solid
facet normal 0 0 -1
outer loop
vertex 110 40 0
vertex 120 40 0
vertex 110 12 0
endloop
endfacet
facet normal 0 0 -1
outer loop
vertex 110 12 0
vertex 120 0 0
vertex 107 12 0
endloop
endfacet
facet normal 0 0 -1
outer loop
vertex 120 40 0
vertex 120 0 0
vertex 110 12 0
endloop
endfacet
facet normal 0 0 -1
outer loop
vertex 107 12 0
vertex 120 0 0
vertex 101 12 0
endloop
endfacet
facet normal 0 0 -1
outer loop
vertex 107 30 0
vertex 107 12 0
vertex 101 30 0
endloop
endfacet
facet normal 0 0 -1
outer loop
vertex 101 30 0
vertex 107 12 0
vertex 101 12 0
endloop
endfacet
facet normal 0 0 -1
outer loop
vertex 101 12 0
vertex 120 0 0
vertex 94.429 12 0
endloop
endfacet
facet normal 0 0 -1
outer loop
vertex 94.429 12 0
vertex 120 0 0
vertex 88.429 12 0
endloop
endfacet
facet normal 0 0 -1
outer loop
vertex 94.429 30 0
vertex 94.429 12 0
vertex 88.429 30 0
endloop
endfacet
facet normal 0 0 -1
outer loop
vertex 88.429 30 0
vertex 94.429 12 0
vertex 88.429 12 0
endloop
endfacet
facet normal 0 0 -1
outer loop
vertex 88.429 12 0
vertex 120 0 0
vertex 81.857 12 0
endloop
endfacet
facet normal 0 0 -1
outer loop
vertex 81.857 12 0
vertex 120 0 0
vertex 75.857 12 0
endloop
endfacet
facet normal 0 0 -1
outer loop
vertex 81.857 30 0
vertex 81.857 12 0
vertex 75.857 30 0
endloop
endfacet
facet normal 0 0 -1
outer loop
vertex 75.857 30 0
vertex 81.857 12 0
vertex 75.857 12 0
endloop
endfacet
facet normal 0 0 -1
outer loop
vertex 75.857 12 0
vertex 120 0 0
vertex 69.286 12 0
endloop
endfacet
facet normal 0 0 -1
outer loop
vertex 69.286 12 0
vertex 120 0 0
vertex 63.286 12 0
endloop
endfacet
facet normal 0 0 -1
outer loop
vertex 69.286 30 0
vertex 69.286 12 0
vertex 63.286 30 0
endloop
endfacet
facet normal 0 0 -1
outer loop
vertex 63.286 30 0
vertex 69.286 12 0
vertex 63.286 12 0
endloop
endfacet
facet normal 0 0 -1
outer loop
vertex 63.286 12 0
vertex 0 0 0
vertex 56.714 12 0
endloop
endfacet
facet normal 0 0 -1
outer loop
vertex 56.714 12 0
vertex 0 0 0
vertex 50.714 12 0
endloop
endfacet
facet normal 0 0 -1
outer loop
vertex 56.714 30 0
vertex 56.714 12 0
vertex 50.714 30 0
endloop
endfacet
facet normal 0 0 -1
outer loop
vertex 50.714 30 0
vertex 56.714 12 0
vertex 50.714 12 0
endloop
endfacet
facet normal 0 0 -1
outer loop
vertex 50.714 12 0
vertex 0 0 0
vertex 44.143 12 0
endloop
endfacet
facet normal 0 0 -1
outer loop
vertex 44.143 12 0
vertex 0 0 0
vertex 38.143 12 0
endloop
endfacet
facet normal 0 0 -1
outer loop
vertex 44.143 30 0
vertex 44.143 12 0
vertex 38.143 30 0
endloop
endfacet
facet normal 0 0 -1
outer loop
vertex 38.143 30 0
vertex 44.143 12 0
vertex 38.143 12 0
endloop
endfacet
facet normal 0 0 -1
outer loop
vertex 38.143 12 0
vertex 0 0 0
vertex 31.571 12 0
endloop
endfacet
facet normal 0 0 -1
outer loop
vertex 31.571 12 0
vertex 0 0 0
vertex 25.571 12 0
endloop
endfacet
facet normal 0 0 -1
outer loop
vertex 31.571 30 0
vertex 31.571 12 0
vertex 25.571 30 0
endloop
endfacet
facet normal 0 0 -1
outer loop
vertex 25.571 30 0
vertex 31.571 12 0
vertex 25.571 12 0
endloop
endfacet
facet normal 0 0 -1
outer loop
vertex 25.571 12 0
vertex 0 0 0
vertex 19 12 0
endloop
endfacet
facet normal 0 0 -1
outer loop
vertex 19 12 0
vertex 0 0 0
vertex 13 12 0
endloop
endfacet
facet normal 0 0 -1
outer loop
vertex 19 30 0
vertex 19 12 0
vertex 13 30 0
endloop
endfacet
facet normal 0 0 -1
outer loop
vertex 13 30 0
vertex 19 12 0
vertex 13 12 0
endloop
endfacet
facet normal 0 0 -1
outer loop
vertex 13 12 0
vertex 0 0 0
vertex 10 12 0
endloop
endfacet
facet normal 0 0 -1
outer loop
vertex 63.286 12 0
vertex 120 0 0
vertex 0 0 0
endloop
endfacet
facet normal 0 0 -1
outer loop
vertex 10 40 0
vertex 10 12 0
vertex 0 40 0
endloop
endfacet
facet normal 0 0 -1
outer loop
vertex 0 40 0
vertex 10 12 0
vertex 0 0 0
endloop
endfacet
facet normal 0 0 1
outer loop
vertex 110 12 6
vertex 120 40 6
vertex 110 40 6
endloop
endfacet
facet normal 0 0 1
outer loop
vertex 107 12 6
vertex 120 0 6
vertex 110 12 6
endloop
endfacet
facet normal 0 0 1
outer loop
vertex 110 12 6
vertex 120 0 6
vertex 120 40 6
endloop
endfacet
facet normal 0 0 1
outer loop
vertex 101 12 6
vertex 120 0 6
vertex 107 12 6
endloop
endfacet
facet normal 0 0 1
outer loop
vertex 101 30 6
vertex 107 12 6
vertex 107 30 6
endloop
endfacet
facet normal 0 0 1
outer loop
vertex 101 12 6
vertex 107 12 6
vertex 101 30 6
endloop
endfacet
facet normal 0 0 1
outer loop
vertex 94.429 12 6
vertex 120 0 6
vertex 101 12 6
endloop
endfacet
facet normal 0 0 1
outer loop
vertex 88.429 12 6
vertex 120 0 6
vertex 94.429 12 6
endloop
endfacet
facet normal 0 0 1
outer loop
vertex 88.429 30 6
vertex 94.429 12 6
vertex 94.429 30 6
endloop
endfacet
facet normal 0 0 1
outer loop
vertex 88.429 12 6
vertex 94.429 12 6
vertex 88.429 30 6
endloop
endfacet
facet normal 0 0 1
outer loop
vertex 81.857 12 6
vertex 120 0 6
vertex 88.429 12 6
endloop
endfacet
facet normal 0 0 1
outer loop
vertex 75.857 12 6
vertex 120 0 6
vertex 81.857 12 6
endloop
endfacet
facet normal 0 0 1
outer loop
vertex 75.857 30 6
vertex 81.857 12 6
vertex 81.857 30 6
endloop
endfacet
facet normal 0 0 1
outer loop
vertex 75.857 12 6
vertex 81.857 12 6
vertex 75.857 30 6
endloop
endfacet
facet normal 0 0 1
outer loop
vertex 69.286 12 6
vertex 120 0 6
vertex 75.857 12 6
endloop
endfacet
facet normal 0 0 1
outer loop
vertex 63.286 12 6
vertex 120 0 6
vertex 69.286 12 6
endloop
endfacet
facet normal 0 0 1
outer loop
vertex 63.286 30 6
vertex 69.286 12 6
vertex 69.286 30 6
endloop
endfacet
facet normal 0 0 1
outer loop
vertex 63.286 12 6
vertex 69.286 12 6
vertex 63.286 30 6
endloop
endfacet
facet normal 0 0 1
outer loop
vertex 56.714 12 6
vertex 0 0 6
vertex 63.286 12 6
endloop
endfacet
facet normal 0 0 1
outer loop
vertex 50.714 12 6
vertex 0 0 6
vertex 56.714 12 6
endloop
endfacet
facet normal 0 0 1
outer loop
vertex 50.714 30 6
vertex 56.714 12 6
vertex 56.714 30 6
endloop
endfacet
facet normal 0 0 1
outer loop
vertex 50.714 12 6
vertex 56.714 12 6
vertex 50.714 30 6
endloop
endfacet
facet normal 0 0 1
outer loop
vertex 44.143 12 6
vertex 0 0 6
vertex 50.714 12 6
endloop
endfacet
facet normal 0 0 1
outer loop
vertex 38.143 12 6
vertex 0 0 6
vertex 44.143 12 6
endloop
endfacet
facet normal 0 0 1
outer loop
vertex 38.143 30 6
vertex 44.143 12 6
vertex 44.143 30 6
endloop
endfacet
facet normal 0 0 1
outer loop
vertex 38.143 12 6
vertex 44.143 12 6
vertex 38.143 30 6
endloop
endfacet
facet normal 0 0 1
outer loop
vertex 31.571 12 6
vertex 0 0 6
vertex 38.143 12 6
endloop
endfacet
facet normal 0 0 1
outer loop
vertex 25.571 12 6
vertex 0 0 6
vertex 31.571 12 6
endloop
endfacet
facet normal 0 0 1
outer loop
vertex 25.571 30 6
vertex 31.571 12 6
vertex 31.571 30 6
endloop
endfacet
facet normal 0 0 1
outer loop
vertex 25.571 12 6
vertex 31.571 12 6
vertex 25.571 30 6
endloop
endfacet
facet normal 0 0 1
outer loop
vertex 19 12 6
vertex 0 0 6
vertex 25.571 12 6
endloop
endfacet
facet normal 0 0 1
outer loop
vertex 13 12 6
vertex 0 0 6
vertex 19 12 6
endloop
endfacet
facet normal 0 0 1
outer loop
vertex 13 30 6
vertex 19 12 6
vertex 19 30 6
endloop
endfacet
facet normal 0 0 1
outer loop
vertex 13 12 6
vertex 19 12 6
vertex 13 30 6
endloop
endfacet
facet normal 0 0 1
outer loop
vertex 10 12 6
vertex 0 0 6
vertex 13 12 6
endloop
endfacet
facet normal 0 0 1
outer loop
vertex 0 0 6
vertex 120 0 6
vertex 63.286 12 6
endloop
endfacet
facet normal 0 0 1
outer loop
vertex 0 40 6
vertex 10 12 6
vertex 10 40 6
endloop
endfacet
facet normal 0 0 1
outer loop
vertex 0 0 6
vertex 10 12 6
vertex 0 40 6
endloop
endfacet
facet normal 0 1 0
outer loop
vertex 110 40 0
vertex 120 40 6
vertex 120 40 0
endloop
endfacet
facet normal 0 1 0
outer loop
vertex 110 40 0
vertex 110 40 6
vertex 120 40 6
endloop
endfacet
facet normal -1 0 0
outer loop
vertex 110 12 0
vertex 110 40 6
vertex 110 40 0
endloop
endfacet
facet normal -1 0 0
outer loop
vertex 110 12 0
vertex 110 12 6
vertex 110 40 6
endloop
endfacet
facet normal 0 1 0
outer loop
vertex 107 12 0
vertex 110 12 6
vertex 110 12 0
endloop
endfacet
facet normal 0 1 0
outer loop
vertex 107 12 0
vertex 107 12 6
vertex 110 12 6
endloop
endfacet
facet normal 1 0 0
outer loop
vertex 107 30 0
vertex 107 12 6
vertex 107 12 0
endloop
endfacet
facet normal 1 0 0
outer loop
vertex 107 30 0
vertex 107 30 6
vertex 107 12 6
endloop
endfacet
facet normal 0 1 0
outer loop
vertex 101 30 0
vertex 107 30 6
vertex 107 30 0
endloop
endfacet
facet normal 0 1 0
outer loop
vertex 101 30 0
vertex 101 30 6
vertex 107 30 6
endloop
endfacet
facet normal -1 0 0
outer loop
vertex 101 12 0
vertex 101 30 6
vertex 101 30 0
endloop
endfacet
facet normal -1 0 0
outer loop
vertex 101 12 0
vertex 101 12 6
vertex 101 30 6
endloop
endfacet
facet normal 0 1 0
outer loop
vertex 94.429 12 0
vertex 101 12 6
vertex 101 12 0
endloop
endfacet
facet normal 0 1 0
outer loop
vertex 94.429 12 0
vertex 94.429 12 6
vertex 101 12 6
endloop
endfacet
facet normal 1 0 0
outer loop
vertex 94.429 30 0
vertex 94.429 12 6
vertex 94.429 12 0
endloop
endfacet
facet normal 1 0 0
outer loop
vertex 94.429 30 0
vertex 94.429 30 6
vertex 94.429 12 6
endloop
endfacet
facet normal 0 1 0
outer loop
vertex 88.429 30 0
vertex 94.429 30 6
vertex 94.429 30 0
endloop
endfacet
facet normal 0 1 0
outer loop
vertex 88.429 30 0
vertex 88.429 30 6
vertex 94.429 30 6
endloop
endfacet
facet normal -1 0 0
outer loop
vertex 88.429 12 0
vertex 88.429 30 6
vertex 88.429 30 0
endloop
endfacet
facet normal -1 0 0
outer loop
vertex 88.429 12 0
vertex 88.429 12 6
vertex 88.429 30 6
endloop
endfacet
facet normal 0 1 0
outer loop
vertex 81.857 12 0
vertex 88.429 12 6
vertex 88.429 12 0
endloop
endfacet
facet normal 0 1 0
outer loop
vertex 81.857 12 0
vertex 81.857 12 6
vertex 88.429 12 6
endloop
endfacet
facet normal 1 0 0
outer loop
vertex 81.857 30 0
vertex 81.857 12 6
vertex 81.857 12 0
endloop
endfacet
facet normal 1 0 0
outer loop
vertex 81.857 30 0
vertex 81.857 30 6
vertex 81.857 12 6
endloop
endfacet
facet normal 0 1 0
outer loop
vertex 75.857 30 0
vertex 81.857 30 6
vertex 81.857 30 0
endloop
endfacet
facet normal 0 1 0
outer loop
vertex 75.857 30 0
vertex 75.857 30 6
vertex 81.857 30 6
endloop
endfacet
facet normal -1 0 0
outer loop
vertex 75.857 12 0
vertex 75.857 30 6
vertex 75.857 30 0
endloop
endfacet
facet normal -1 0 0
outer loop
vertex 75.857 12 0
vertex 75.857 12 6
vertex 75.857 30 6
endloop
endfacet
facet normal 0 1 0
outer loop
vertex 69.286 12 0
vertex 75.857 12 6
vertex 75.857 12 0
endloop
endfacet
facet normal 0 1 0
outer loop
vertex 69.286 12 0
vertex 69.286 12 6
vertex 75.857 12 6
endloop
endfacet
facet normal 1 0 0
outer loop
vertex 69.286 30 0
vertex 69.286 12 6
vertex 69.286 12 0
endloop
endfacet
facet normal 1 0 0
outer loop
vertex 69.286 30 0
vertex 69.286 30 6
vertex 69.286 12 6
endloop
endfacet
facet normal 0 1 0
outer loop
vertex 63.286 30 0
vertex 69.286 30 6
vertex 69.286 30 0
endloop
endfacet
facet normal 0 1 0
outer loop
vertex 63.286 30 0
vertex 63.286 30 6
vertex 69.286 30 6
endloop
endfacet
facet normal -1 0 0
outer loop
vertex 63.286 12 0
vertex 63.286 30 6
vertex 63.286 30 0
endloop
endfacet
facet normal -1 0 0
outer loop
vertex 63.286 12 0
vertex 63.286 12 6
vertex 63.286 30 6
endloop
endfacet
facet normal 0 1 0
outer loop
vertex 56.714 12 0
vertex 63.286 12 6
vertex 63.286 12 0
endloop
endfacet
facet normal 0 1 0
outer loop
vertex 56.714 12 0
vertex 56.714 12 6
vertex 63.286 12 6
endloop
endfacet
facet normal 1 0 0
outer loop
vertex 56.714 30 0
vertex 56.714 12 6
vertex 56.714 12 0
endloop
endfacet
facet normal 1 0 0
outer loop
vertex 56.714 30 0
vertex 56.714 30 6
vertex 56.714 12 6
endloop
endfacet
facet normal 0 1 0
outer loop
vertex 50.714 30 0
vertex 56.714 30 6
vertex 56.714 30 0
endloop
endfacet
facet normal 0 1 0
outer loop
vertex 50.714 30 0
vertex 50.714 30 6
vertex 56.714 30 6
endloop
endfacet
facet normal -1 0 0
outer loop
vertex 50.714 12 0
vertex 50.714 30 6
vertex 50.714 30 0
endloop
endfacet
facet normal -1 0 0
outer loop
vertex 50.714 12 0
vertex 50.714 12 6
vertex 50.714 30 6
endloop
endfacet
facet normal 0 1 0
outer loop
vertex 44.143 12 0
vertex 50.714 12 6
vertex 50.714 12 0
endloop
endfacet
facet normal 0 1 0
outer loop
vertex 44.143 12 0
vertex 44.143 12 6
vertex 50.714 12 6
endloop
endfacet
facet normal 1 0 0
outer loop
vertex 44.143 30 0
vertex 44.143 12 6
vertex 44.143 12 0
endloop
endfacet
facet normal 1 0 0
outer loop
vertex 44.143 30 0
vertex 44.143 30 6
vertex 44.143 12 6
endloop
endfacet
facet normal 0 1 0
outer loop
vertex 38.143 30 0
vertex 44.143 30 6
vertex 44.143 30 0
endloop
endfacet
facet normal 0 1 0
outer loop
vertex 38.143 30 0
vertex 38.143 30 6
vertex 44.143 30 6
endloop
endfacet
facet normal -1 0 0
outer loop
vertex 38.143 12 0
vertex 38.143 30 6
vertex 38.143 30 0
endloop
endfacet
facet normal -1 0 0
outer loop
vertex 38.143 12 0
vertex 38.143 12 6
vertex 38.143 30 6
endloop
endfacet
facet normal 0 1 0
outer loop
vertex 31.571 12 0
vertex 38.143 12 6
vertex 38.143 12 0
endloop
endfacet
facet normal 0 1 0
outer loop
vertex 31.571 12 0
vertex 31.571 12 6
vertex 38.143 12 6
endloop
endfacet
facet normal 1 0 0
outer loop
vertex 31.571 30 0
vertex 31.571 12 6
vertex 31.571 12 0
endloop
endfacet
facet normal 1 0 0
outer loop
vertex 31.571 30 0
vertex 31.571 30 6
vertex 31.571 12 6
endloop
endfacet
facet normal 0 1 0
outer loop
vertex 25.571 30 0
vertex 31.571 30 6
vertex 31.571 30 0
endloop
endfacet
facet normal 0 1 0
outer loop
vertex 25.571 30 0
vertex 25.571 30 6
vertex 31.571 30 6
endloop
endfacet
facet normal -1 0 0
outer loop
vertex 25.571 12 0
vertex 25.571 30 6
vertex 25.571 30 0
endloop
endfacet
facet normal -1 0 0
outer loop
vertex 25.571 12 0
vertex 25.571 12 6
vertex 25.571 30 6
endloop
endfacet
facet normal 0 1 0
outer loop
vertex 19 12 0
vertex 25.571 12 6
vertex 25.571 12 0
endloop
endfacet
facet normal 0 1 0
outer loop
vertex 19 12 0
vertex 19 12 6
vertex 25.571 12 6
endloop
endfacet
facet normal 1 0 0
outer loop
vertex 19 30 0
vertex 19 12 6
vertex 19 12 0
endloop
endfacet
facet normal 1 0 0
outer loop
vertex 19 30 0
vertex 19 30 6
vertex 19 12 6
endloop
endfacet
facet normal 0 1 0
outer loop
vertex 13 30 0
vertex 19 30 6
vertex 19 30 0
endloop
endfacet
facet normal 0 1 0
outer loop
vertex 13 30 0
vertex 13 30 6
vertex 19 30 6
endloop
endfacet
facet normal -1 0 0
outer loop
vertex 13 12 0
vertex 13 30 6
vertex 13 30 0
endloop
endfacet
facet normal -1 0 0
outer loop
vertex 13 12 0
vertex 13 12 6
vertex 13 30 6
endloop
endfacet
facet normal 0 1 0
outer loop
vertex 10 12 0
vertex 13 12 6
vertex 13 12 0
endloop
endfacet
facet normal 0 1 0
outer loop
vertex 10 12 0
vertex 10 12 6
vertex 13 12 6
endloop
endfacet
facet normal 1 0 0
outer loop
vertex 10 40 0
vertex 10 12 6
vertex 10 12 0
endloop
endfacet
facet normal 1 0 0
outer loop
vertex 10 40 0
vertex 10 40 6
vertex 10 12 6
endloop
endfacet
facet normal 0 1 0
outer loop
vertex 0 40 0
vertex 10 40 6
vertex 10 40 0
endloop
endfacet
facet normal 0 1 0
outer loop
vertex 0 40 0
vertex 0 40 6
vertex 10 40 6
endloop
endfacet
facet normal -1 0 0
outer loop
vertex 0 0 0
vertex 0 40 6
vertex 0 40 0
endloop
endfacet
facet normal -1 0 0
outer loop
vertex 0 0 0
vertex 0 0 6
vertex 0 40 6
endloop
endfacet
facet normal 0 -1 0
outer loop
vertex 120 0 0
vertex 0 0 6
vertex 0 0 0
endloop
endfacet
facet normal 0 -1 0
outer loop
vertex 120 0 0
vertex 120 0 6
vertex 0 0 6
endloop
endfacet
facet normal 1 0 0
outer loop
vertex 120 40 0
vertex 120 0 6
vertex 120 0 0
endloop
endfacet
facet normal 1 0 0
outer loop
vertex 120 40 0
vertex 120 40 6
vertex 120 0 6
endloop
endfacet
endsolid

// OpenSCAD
$fn = 32;

// ----------------------------------------------------------------------
// Guard grille: 8 slats over a 120 x 40 mm plate
// ----------------------------------------------------------------------

// --- parameters (mm) ---
profile_height = 6;       // extrusion height
profile_points = 40;      // points of the closed outline

profile = [[0, 0], [120, 0], [120, 40], [110, 40], [110, 12], [107, 12], [107, 30], [101, 30], [101, 12], [94.429, 12], [94.429, 30], [88.429, 30], [88.429, 12], [81.857, 12], [81.857, 30], [75.857, 30], [75.857, 12], [69.286, 12], [69.286, 30], [63.286, 30], [63.286, 12], [56.714, 12], [56.714, 30], [50.714, 30], [50.714, 12], [44.143, 12], [44.143, 30], [38.143, 30], [38.143, 12], [31.571, 12], [31.571, 30], [25.571, 30], [25.571, 12], [19, 12], [19, 30], [13, 30], [13, 12], [10, 12], [10, 40], [0, 40]];  // single closed polygon, 40 points, counter clockwise

// --- the one profile operation ---
linear_extrude(height = profile_height) polygon(points = profile);
